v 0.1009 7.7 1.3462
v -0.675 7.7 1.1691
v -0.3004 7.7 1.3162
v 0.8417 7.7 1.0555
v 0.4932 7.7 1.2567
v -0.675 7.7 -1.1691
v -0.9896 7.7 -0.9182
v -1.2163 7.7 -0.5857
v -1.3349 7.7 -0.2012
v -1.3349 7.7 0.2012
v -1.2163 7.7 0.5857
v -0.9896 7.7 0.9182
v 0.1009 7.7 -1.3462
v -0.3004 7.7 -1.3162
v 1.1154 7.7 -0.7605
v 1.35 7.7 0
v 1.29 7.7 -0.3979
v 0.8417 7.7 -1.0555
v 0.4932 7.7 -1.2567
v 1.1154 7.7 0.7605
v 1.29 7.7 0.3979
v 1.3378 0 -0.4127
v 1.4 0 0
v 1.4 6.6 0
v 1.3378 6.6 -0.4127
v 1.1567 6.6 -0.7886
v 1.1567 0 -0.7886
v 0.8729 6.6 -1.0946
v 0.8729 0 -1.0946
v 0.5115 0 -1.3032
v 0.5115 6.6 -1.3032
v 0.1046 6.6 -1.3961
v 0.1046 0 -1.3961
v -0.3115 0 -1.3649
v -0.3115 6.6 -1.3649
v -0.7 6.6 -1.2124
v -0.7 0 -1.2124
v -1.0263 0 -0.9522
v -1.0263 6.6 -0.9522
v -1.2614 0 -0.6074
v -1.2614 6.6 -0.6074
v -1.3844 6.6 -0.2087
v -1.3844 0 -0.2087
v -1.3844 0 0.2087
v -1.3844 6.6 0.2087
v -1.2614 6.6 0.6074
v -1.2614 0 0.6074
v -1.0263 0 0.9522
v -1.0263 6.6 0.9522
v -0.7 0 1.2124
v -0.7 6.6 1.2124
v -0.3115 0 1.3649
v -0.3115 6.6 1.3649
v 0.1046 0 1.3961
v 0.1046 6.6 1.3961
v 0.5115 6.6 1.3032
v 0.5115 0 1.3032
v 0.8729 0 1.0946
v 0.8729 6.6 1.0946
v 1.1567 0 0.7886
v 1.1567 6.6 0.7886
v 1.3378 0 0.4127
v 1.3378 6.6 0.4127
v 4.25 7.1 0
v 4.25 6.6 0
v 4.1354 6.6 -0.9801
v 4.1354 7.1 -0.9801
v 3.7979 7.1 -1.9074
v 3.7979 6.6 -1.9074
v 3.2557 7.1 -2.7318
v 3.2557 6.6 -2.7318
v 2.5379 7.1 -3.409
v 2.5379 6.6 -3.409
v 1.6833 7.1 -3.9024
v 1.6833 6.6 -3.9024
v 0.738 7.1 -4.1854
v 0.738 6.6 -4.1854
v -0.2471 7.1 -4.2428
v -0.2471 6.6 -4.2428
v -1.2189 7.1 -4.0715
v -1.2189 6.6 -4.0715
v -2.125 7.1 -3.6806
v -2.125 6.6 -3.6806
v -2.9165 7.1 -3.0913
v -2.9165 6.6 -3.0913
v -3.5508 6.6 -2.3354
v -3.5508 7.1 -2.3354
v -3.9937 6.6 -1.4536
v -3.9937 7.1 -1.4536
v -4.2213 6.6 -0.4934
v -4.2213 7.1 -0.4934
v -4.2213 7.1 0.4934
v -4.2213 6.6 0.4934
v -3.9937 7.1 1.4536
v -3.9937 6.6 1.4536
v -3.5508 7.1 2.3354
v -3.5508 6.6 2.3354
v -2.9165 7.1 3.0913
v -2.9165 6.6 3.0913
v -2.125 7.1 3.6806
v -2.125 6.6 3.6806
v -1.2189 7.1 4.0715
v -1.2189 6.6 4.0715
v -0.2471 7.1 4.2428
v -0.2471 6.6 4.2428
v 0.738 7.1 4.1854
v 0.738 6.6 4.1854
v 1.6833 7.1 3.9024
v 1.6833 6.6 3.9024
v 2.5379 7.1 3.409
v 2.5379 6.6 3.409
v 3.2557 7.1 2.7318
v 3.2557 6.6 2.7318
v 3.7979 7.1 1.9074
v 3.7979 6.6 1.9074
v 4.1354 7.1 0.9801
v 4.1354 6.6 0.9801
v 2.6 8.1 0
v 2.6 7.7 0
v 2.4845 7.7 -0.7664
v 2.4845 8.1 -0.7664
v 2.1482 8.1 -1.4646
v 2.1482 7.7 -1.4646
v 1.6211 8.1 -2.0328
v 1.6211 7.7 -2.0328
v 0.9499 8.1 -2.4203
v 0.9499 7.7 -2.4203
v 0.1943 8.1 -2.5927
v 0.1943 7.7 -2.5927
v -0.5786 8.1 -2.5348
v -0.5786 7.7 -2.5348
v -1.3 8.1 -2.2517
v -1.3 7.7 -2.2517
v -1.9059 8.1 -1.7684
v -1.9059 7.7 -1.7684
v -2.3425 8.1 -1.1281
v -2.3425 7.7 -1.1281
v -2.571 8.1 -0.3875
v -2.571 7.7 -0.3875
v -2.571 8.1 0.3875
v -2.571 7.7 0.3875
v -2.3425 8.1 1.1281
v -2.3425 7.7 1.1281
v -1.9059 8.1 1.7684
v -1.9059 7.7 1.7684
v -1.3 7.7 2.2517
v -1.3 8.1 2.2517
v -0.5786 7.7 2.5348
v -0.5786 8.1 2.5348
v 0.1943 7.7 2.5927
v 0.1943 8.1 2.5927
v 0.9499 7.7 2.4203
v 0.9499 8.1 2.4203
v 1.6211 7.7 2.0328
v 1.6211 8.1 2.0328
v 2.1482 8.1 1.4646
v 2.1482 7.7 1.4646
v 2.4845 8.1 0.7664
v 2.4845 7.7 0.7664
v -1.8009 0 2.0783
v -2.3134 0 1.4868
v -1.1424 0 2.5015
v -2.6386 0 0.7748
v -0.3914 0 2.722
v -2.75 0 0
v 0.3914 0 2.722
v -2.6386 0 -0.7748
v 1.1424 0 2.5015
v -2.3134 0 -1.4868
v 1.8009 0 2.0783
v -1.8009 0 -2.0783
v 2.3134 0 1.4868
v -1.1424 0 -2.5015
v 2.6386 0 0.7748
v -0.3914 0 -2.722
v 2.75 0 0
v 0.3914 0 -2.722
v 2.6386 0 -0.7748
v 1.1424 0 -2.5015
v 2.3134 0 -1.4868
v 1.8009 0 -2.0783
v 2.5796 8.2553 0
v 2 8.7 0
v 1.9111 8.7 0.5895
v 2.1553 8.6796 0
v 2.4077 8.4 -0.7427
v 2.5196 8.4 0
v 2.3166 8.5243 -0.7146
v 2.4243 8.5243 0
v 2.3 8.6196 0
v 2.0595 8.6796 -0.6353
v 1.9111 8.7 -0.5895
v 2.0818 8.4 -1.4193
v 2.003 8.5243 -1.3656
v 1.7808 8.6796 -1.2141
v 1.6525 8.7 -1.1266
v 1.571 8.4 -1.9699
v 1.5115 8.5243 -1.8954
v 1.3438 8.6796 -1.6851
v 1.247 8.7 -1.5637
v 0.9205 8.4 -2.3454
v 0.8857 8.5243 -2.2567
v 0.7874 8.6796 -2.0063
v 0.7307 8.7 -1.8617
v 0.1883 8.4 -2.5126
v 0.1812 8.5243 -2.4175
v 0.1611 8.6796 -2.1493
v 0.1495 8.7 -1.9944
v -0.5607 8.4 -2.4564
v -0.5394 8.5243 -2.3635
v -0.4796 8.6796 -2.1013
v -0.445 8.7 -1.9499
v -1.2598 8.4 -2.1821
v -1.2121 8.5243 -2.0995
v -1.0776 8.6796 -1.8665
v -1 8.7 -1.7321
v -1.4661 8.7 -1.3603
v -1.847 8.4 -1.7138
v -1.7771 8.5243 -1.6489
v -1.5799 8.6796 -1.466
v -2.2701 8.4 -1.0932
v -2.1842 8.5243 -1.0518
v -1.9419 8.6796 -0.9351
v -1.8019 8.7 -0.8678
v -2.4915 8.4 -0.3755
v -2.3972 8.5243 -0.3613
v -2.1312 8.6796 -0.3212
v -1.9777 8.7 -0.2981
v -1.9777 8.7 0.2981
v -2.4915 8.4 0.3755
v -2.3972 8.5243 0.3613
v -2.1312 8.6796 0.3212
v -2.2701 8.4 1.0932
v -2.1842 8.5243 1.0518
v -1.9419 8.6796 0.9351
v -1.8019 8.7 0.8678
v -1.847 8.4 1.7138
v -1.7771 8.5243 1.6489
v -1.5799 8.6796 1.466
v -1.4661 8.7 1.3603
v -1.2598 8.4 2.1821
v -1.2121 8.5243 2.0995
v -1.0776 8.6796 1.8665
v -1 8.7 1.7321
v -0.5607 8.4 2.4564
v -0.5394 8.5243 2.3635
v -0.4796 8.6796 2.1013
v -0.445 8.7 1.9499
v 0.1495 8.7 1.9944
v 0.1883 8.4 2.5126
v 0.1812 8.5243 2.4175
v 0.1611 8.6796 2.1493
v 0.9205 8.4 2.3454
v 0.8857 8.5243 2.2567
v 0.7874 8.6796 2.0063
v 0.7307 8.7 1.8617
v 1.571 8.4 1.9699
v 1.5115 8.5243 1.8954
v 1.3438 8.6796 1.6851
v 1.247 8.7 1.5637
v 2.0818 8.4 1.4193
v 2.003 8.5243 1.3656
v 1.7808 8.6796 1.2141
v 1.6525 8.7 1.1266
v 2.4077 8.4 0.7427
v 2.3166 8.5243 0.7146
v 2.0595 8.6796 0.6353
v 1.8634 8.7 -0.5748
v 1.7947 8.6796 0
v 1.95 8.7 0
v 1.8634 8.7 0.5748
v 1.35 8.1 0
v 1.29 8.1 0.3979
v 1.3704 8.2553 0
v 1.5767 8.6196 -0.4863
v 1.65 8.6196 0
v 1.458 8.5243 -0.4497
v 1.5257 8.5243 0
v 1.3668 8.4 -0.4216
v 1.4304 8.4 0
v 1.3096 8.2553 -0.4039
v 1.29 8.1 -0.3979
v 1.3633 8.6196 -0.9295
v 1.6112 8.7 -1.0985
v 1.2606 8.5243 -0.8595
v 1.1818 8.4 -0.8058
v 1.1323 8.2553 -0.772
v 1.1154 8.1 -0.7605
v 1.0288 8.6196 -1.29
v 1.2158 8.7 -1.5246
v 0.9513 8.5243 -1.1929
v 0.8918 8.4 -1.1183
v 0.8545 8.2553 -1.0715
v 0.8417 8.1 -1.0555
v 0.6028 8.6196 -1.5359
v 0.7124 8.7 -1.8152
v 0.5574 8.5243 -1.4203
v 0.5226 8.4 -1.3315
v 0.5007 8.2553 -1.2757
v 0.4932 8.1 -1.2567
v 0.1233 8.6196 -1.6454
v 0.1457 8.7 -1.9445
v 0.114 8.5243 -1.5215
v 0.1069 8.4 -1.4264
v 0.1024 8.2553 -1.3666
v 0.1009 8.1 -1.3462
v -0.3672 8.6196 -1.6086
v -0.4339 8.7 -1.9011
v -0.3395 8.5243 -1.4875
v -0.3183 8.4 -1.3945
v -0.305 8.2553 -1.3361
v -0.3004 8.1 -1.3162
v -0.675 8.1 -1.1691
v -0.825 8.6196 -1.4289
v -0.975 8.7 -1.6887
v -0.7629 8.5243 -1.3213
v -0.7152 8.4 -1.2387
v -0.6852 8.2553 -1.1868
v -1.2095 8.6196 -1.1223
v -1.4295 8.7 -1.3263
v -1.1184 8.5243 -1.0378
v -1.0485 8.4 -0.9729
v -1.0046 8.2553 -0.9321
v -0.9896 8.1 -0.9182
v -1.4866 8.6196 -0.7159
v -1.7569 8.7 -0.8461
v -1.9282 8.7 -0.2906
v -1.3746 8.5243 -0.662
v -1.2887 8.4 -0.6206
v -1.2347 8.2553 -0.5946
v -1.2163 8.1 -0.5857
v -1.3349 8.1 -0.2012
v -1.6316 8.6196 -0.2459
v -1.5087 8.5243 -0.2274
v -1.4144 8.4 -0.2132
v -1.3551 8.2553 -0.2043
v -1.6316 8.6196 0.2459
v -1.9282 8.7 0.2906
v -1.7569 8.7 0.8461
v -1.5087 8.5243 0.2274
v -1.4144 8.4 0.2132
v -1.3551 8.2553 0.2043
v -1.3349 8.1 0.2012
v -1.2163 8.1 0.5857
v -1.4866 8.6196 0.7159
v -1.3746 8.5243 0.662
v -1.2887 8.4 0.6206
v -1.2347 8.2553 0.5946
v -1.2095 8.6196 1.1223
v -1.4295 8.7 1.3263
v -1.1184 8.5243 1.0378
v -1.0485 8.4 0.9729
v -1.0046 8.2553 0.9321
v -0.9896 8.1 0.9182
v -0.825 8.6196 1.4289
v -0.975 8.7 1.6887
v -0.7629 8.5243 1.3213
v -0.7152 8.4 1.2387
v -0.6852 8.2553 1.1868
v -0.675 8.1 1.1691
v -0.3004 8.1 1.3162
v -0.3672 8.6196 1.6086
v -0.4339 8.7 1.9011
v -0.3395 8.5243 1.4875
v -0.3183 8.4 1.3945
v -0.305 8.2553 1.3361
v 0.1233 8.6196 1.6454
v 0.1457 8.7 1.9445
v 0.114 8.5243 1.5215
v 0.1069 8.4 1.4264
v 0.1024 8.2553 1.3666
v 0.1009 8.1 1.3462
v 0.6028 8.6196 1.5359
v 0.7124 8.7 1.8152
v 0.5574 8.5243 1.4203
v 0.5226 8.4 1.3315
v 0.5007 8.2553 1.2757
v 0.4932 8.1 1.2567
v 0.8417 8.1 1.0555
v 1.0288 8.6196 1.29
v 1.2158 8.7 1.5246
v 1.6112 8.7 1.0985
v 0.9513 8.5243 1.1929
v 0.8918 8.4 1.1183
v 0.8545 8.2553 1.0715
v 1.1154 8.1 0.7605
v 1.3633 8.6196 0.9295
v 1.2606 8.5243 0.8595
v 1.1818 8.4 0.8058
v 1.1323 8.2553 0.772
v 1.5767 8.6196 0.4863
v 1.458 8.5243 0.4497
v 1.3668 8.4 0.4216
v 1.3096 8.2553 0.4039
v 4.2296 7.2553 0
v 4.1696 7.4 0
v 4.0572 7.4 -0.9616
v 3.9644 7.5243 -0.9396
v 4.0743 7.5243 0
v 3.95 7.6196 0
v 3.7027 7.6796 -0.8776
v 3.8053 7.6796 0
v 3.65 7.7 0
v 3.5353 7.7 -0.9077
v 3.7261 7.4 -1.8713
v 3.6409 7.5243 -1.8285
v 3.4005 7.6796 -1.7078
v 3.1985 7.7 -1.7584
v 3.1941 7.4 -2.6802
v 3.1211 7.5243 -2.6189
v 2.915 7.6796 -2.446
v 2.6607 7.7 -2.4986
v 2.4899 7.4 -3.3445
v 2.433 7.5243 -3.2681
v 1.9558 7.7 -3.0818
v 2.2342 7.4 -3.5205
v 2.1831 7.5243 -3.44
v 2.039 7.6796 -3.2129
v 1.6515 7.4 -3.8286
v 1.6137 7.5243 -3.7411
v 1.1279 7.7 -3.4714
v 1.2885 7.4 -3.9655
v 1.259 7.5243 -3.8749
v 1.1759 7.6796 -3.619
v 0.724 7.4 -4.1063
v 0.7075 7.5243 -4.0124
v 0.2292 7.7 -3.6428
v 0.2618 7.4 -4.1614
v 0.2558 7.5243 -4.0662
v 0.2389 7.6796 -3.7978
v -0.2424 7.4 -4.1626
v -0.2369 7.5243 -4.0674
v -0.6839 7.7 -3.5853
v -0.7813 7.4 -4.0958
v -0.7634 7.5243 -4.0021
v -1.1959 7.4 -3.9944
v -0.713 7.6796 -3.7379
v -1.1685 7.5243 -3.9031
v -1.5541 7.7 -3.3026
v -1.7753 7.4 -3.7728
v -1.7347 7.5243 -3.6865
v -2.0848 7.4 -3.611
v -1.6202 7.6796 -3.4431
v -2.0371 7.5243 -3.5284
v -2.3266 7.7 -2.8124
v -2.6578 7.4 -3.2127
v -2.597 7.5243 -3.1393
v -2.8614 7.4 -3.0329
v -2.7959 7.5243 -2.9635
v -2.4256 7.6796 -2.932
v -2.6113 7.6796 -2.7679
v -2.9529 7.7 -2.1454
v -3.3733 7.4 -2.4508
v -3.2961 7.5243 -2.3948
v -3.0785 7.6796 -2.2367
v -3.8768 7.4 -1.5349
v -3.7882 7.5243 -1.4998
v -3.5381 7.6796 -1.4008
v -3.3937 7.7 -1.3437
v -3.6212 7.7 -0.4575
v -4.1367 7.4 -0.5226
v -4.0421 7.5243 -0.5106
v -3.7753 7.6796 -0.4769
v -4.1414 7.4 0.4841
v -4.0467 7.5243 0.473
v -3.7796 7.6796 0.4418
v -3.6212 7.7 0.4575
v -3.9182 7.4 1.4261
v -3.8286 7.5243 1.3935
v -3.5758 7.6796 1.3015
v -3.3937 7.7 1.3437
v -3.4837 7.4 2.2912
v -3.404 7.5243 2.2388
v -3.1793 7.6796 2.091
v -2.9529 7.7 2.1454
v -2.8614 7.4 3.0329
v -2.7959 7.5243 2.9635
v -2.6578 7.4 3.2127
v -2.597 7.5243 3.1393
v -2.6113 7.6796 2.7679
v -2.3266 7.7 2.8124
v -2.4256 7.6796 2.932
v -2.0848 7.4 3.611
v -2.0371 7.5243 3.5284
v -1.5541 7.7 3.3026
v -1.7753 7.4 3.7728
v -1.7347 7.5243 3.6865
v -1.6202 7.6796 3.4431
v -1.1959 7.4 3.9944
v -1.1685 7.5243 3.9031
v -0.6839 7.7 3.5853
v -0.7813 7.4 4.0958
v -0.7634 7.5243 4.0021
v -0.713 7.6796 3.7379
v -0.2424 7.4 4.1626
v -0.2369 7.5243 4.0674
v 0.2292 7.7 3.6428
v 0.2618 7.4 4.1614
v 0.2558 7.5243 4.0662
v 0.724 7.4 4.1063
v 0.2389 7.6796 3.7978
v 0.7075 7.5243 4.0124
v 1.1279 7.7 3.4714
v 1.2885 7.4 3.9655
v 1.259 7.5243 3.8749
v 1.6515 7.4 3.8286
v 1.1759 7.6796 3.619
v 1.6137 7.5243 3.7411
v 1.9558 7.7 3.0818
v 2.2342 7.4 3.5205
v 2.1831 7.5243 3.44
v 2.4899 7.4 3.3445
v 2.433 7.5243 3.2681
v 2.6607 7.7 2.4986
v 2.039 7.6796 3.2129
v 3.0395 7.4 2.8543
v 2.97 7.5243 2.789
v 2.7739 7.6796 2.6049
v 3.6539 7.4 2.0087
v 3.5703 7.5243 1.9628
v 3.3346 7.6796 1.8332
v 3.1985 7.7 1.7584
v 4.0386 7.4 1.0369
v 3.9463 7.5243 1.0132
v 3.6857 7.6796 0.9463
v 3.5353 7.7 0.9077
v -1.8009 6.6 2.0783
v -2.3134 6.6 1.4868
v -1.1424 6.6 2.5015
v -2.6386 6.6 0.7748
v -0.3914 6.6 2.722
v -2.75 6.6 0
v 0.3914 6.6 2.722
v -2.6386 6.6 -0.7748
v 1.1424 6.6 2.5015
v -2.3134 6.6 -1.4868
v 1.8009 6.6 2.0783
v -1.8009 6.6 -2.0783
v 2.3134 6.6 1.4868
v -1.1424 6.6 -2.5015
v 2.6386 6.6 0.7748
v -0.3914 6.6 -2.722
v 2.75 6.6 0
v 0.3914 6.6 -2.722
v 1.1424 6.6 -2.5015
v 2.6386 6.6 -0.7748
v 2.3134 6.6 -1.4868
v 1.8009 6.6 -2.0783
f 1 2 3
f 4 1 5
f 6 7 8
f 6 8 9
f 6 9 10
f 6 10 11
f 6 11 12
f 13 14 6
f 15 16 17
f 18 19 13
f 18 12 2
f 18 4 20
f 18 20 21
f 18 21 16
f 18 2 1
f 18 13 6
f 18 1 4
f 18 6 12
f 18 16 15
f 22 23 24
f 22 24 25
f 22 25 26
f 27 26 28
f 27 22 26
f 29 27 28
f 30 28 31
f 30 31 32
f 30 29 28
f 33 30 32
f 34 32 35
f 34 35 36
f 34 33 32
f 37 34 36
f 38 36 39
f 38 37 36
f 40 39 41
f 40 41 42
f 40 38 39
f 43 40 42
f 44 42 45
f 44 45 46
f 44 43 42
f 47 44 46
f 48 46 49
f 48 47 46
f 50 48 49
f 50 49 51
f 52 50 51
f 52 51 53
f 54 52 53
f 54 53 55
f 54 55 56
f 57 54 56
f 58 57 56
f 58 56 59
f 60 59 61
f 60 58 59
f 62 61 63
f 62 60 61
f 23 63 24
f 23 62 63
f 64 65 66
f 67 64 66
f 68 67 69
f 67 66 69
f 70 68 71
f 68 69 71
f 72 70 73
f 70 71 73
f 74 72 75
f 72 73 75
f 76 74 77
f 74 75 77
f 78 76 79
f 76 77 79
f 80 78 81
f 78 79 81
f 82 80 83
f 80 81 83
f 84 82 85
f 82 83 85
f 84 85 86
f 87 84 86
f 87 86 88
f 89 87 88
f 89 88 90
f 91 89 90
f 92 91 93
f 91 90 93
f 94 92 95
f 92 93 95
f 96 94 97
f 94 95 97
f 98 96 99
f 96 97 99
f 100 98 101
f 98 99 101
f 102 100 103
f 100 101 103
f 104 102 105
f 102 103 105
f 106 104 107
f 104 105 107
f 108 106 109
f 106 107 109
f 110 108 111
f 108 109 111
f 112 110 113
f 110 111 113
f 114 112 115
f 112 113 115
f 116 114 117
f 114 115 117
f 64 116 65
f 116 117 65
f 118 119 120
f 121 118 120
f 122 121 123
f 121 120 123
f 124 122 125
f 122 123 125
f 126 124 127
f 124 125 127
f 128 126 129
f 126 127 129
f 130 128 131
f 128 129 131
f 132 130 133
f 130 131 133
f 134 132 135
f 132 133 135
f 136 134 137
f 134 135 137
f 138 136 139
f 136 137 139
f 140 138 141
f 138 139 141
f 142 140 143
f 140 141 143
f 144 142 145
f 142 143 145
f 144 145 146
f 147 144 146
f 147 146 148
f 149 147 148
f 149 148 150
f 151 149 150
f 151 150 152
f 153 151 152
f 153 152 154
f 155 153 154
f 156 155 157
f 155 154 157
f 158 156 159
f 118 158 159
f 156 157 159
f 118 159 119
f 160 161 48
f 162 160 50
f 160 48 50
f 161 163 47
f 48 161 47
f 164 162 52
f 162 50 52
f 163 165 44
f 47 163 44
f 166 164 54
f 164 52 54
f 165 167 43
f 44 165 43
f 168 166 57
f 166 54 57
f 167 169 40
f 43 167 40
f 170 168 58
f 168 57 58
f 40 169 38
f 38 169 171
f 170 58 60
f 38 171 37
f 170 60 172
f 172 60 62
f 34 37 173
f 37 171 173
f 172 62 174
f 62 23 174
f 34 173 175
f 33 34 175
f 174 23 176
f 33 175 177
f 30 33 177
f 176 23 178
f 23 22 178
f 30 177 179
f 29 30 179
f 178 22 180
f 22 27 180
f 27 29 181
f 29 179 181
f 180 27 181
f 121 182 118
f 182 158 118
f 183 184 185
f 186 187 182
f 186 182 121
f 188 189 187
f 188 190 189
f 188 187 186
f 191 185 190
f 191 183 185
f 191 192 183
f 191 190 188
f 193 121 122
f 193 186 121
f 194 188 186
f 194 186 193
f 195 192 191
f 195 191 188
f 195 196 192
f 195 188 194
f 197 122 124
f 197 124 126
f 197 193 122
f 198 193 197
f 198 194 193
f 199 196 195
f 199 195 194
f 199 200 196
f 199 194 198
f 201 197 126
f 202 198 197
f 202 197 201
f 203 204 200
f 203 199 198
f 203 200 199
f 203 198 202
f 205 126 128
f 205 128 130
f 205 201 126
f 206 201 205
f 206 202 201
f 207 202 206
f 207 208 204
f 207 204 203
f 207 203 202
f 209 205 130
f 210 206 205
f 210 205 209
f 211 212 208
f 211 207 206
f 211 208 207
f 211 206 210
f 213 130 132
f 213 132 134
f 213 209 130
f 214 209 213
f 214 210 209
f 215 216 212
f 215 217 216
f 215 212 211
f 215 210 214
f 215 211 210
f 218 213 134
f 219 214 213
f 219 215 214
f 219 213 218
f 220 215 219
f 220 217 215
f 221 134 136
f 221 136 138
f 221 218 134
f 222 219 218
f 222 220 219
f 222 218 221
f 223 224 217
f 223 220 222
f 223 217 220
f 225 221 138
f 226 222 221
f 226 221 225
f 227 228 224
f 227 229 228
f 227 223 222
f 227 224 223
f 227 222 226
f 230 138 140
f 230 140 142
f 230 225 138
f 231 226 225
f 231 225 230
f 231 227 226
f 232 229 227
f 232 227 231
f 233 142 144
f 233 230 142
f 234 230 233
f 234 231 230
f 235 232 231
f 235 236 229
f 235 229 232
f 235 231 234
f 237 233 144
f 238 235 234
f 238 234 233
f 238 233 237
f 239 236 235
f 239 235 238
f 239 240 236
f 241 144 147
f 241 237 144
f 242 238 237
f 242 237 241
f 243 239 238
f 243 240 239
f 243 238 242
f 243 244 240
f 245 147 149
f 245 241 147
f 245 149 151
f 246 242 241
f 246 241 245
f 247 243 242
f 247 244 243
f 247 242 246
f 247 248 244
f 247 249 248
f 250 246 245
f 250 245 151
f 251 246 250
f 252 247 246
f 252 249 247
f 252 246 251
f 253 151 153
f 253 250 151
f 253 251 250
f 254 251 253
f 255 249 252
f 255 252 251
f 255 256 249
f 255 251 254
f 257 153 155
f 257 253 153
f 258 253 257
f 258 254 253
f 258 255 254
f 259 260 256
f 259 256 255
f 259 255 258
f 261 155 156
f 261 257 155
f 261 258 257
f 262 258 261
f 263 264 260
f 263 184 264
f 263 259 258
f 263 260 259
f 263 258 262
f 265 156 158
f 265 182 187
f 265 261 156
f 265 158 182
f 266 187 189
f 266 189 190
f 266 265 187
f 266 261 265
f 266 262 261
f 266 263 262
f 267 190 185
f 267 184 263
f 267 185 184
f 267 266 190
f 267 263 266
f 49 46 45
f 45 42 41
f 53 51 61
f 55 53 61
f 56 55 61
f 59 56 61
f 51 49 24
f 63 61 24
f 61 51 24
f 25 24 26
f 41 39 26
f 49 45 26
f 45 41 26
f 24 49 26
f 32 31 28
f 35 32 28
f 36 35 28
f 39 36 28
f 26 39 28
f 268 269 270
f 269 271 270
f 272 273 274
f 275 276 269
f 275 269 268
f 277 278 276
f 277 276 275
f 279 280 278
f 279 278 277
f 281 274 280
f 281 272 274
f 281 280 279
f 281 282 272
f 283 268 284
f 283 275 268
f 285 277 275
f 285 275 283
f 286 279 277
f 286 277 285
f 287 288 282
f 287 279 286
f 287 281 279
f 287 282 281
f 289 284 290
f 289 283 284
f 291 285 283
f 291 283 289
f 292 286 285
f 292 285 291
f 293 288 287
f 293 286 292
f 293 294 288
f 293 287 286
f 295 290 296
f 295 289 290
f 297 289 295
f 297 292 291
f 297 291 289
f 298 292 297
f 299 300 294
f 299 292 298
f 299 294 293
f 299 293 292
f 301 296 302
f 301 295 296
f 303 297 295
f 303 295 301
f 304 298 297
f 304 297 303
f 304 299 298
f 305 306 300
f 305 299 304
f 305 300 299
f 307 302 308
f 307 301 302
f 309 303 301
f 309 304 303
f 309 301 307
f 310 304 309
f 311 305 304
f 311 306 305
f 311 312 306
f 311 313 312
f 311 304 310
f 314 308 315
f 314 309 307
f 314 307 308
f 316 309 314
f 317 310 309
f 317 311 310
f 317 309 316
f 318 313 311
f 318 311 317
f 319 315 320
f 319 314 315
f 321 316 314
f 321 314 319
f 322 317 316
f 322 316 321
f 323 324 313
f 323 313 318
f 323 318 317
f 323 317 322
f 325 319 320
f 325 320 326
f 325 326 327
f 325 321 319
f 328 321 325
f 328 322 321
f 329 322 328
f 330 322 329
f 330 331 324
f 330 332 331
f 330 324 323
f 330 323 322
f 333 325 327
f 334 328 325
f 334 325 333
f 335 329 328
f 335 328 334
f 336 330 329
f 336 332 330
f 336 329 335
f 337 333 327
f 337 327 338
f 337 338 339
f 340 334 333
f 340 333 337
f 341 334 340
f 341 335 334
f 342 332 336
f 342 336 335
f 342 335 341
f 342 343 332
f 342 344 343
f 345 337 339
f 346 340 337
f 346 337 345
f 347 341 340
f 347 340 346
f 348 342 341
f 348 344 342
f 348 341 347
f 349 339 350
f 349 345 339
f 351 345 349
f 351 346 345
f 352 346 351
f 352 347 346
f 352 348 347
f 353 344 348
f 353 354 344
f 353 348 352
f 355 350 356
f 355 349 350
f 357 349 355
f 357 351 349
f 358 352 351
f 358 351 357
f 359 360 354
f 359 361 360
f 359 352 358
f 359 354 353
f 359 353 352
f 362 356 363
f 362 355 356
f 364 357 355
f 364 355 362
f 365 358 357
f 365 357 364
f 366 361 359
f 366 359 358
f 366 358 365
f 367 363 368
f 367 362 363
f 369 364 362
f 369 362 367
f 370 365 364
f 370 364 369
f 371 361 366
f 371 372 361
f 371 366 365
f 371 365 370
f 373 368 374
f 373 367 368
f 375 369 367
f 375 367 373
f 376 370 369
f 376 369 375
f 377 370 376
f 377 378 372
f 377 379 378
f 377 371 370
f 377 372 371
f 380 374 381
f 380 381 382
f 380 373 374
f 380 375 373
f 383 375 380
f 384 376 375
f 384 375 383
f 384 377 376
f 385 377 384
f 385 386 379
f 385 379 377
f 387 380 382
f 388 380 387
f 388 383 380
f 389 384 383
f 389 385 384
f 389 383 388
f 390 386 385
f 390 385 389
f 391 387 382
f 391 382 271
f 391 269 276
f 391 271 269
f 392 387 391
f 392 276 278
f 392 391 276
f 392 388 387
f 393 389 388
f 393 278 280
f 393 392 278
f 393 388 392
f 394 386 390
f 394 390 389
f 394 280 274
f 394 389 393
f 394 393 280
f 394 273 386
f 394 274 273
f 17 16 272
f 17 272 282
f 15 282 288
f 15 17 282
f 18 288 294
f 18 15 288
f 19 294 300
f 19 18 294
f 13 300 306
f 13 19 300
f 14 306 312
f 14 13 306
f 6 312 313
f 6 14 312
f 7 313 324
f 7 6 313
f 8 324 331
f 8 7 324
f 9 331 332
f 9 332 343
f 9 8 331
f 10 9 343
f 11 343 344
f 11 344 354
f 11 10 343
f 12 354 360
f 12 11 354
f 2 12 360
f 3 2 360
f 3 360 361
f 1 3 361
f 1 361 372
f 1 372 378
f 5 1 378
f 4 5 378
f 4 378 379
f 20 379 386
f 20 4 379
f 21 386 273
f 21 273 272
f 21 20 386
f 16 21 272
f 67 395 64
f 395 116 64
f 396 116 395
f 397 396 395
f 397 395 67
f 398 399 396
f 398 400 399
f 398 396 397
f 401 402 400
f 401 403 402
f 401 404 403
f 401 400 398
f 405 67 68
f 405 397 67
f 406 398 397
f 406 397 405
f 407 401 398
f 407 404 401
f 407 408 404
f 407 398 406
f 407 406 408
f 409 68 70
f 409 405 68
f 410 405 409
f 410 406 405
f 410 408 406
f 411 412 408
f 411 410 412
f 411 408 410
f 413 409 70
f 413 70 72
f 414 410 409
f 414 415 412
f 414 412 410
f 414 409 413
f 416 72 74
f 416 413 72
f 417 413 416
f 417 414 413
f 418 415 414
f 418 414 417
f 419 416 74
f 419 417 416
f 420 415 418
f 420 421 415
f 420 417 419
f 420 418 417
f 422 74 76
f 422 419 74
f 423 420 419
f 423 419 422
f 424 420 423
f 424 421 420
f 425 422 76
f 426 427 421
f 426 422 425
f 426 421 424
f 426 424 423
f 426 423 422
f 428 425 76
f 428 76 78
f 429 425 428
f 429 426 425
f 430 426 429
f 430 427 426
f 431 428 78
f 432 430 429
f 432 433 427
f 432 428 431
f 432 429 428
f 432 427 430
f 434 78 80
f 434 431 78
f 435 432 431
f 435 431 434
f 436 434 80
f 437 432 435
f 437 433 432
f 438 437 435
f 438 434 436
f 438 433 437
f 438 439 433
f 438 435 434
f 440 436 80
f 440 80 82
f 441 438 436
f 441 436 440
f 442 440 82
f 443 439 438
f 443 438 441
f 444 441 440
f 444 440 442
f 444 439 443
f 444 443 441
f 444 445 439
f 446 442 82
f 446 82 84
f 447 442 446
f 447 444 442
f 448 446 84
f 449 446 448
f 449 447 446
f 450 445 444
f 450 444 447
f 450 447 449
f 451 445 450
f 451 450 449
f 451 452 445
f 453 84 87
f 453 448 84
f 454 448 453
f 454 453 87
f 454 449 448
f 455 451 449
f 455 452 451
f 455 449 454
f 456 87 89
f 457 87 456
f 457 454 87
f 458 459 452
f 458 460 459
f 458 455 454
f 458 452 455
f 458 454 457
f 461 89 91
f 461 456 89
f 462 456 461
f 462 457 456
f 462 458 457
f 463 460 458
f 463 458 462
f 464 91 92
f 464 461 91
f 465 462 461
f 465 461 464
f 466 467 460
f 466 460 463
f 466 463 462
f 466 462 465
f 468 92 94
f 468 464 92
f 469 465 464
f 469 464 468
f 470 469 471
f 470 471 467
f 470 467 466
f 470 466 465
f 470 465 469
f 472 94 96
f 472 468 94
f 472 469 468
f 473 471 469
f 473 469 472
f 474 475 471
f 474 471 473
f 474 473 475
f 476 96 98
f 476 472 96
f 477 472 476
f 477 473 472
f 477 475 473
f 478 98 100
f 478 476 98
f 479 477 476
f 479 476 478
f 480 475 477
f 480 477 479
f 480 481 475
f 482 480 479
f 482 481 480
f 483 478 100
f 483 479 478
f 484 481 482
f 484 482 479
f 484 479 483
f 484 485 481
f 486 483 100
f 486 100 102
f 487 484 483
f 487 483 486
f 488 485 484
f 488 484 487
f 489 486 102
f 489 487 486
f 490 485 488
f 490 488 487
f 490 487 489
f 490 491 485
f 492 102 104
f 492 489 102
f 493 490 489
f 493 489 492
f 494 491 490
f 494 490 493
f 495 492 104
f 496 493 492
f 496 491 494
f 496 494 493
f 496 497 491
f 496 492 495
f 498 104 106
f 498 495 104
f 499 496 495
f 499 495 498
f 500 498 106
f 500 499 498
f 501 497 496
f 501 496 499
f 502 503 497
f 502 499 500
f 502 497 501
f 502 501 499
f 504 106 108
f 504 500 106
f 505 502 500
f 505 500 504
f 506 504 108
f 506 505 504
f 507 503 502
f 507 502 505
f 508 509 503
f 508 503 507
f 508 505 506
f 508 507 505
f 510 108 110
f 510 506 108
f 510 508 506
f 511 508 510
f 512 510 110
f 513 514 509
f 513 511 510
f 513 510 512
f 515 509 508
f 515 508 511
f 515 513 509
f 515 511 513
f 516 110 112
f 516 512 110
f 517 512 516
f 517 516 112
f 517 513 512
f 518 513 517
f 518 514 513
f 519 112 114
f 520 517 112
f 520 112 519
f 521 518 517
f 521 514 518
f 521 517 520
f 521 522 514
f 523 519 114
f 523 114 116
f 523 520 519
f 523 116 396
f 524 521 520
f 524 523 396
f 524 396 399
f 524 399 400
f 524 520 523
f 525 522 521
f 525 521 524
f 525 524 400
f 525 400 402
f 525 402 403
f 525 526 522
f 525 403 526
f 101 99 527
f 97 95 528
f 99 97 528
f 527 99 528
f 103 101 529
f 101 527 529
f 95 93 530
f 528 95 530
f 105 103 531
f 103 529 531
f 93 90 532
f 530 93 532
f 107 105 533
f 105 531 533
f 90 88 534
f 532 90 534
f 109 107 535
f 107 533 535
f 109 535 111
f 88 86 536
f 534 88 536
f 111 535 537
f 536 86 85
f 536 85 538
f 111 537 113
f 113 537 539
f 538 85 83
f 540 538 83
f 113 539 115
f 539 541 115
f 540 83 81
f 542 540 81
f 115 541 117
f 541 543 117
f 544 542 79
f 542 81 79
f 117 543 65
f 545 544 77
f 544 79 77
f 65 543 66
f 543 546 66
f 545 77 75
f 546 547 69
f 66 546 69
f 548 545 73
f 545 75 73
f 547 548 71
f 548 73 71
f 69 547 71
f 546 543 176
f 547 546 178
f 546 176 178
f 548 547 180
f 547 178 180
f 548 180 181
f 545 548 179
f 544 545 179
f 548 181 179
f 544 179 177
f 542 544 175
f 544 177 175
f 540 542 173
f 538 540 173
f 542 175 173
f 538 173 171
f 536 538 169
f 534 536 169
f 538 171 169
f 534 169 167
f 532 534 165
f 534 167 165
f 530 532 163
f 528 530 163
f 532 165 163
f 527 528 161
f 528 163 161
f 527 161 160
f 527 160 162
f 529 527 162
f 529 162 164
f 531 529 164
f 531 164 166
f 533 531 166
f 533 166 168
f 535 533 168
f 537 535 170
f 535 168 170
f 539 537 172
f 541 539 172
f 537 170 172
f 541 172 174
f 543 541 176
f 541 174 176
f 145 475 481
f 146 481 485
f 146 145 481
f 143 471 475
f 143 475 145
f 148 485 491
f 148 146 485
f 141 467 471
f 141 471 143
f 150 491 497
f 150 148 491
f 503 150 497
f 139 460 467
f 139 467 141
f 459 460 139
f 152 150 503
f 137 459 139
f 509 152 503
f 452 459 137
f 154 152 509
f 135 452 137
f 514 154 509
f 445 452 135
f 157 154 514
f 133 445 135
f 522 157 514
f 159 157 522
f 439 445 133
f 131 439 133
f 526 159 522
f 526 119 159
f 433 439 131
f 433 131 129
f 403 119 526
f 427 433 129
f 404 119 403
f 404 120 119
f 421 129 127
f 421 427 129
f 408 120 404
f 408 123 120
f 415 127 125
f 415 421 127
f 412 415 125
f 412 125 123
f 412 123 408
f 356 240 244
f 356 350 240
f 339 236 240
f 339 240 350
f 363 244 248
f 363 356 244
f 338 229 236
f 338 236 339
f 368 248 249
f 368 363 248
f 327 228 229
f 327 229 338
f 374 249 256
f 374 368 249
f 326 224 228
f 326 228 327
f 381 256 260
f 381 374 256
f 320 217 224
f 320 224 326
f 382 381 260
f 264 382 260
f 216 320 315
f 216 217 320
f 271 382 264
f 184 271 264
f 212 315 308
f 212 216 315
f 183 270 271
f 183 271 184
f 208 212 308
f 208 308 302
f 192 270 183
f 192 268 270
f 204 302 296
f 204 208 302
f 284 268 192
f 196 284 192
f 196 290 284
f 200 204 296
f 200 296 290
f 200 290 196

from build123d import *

# Parameters (mm, degrees)
SKETCH1_R           = 2.75
SKETCH1_R_2         = 1.4
BOSS_EXTRUDE1_DEPTH = 6.6
SKETCH2_R           = 4.25
BOSS_EXTRUDE2_DEPTH = 1.1
SKETCH3_R           = 2.6
SKETCH3_R_2         = 1.35
BOSS_EXTRUDE3_DEPTH = 1
FILLET1_R           = 0.6


with BuildPart() as part:
    # Sketch1 → Boss-Extrude1 (new body)
    with BuildSketch(Plane(origin=(0, 0, 0), x_dir=(1, 0, 0), z_dir=(0, 1, 0))):
        Circle(SKETCH1_R)
        Circle(SKETCH1_R_2, mode=Mode.SUBTRACT)
    extrude(amount=BOSS_EXTRUDE1_DEPTH)

    # Sketch2 → Boss-Extrude2 (add)
    with BuildSketch(Plane(origin=(0, 6.6, 0), x_dir=(1, 0, 0), z_dir=(0, 1, 0))):
        Circle(SKETCH2_R)
    extrude(amount=BOSS_EXTRUDE2_DEPTH)

    # Sketch3 → Boss-Extrude3 (add)
    with BuildSketch(Plane(origin=(0, 7.7, 0), x_dir=(1, 0, 0), z_dir=(0, 1, 0))):
        Circle(SKETCH3_R)
        Circle(SKETCH3_R_2, mode=Mode.SUBTRACT)
    extrude(amount=BOSS_EXTRUDE3_DEPTH)

    # Fillet1
    fillet1_edges = [part.edges().sort_by_distance(p)[0] for p in [
        (-2.6, 8.7, 0),
        (-1.35, 8.7, 0),
        (-4.25, 7.7, 0),
    ]]
    fillet(fillet1_edges, radius=FILLET1_R)


solid = part.part
